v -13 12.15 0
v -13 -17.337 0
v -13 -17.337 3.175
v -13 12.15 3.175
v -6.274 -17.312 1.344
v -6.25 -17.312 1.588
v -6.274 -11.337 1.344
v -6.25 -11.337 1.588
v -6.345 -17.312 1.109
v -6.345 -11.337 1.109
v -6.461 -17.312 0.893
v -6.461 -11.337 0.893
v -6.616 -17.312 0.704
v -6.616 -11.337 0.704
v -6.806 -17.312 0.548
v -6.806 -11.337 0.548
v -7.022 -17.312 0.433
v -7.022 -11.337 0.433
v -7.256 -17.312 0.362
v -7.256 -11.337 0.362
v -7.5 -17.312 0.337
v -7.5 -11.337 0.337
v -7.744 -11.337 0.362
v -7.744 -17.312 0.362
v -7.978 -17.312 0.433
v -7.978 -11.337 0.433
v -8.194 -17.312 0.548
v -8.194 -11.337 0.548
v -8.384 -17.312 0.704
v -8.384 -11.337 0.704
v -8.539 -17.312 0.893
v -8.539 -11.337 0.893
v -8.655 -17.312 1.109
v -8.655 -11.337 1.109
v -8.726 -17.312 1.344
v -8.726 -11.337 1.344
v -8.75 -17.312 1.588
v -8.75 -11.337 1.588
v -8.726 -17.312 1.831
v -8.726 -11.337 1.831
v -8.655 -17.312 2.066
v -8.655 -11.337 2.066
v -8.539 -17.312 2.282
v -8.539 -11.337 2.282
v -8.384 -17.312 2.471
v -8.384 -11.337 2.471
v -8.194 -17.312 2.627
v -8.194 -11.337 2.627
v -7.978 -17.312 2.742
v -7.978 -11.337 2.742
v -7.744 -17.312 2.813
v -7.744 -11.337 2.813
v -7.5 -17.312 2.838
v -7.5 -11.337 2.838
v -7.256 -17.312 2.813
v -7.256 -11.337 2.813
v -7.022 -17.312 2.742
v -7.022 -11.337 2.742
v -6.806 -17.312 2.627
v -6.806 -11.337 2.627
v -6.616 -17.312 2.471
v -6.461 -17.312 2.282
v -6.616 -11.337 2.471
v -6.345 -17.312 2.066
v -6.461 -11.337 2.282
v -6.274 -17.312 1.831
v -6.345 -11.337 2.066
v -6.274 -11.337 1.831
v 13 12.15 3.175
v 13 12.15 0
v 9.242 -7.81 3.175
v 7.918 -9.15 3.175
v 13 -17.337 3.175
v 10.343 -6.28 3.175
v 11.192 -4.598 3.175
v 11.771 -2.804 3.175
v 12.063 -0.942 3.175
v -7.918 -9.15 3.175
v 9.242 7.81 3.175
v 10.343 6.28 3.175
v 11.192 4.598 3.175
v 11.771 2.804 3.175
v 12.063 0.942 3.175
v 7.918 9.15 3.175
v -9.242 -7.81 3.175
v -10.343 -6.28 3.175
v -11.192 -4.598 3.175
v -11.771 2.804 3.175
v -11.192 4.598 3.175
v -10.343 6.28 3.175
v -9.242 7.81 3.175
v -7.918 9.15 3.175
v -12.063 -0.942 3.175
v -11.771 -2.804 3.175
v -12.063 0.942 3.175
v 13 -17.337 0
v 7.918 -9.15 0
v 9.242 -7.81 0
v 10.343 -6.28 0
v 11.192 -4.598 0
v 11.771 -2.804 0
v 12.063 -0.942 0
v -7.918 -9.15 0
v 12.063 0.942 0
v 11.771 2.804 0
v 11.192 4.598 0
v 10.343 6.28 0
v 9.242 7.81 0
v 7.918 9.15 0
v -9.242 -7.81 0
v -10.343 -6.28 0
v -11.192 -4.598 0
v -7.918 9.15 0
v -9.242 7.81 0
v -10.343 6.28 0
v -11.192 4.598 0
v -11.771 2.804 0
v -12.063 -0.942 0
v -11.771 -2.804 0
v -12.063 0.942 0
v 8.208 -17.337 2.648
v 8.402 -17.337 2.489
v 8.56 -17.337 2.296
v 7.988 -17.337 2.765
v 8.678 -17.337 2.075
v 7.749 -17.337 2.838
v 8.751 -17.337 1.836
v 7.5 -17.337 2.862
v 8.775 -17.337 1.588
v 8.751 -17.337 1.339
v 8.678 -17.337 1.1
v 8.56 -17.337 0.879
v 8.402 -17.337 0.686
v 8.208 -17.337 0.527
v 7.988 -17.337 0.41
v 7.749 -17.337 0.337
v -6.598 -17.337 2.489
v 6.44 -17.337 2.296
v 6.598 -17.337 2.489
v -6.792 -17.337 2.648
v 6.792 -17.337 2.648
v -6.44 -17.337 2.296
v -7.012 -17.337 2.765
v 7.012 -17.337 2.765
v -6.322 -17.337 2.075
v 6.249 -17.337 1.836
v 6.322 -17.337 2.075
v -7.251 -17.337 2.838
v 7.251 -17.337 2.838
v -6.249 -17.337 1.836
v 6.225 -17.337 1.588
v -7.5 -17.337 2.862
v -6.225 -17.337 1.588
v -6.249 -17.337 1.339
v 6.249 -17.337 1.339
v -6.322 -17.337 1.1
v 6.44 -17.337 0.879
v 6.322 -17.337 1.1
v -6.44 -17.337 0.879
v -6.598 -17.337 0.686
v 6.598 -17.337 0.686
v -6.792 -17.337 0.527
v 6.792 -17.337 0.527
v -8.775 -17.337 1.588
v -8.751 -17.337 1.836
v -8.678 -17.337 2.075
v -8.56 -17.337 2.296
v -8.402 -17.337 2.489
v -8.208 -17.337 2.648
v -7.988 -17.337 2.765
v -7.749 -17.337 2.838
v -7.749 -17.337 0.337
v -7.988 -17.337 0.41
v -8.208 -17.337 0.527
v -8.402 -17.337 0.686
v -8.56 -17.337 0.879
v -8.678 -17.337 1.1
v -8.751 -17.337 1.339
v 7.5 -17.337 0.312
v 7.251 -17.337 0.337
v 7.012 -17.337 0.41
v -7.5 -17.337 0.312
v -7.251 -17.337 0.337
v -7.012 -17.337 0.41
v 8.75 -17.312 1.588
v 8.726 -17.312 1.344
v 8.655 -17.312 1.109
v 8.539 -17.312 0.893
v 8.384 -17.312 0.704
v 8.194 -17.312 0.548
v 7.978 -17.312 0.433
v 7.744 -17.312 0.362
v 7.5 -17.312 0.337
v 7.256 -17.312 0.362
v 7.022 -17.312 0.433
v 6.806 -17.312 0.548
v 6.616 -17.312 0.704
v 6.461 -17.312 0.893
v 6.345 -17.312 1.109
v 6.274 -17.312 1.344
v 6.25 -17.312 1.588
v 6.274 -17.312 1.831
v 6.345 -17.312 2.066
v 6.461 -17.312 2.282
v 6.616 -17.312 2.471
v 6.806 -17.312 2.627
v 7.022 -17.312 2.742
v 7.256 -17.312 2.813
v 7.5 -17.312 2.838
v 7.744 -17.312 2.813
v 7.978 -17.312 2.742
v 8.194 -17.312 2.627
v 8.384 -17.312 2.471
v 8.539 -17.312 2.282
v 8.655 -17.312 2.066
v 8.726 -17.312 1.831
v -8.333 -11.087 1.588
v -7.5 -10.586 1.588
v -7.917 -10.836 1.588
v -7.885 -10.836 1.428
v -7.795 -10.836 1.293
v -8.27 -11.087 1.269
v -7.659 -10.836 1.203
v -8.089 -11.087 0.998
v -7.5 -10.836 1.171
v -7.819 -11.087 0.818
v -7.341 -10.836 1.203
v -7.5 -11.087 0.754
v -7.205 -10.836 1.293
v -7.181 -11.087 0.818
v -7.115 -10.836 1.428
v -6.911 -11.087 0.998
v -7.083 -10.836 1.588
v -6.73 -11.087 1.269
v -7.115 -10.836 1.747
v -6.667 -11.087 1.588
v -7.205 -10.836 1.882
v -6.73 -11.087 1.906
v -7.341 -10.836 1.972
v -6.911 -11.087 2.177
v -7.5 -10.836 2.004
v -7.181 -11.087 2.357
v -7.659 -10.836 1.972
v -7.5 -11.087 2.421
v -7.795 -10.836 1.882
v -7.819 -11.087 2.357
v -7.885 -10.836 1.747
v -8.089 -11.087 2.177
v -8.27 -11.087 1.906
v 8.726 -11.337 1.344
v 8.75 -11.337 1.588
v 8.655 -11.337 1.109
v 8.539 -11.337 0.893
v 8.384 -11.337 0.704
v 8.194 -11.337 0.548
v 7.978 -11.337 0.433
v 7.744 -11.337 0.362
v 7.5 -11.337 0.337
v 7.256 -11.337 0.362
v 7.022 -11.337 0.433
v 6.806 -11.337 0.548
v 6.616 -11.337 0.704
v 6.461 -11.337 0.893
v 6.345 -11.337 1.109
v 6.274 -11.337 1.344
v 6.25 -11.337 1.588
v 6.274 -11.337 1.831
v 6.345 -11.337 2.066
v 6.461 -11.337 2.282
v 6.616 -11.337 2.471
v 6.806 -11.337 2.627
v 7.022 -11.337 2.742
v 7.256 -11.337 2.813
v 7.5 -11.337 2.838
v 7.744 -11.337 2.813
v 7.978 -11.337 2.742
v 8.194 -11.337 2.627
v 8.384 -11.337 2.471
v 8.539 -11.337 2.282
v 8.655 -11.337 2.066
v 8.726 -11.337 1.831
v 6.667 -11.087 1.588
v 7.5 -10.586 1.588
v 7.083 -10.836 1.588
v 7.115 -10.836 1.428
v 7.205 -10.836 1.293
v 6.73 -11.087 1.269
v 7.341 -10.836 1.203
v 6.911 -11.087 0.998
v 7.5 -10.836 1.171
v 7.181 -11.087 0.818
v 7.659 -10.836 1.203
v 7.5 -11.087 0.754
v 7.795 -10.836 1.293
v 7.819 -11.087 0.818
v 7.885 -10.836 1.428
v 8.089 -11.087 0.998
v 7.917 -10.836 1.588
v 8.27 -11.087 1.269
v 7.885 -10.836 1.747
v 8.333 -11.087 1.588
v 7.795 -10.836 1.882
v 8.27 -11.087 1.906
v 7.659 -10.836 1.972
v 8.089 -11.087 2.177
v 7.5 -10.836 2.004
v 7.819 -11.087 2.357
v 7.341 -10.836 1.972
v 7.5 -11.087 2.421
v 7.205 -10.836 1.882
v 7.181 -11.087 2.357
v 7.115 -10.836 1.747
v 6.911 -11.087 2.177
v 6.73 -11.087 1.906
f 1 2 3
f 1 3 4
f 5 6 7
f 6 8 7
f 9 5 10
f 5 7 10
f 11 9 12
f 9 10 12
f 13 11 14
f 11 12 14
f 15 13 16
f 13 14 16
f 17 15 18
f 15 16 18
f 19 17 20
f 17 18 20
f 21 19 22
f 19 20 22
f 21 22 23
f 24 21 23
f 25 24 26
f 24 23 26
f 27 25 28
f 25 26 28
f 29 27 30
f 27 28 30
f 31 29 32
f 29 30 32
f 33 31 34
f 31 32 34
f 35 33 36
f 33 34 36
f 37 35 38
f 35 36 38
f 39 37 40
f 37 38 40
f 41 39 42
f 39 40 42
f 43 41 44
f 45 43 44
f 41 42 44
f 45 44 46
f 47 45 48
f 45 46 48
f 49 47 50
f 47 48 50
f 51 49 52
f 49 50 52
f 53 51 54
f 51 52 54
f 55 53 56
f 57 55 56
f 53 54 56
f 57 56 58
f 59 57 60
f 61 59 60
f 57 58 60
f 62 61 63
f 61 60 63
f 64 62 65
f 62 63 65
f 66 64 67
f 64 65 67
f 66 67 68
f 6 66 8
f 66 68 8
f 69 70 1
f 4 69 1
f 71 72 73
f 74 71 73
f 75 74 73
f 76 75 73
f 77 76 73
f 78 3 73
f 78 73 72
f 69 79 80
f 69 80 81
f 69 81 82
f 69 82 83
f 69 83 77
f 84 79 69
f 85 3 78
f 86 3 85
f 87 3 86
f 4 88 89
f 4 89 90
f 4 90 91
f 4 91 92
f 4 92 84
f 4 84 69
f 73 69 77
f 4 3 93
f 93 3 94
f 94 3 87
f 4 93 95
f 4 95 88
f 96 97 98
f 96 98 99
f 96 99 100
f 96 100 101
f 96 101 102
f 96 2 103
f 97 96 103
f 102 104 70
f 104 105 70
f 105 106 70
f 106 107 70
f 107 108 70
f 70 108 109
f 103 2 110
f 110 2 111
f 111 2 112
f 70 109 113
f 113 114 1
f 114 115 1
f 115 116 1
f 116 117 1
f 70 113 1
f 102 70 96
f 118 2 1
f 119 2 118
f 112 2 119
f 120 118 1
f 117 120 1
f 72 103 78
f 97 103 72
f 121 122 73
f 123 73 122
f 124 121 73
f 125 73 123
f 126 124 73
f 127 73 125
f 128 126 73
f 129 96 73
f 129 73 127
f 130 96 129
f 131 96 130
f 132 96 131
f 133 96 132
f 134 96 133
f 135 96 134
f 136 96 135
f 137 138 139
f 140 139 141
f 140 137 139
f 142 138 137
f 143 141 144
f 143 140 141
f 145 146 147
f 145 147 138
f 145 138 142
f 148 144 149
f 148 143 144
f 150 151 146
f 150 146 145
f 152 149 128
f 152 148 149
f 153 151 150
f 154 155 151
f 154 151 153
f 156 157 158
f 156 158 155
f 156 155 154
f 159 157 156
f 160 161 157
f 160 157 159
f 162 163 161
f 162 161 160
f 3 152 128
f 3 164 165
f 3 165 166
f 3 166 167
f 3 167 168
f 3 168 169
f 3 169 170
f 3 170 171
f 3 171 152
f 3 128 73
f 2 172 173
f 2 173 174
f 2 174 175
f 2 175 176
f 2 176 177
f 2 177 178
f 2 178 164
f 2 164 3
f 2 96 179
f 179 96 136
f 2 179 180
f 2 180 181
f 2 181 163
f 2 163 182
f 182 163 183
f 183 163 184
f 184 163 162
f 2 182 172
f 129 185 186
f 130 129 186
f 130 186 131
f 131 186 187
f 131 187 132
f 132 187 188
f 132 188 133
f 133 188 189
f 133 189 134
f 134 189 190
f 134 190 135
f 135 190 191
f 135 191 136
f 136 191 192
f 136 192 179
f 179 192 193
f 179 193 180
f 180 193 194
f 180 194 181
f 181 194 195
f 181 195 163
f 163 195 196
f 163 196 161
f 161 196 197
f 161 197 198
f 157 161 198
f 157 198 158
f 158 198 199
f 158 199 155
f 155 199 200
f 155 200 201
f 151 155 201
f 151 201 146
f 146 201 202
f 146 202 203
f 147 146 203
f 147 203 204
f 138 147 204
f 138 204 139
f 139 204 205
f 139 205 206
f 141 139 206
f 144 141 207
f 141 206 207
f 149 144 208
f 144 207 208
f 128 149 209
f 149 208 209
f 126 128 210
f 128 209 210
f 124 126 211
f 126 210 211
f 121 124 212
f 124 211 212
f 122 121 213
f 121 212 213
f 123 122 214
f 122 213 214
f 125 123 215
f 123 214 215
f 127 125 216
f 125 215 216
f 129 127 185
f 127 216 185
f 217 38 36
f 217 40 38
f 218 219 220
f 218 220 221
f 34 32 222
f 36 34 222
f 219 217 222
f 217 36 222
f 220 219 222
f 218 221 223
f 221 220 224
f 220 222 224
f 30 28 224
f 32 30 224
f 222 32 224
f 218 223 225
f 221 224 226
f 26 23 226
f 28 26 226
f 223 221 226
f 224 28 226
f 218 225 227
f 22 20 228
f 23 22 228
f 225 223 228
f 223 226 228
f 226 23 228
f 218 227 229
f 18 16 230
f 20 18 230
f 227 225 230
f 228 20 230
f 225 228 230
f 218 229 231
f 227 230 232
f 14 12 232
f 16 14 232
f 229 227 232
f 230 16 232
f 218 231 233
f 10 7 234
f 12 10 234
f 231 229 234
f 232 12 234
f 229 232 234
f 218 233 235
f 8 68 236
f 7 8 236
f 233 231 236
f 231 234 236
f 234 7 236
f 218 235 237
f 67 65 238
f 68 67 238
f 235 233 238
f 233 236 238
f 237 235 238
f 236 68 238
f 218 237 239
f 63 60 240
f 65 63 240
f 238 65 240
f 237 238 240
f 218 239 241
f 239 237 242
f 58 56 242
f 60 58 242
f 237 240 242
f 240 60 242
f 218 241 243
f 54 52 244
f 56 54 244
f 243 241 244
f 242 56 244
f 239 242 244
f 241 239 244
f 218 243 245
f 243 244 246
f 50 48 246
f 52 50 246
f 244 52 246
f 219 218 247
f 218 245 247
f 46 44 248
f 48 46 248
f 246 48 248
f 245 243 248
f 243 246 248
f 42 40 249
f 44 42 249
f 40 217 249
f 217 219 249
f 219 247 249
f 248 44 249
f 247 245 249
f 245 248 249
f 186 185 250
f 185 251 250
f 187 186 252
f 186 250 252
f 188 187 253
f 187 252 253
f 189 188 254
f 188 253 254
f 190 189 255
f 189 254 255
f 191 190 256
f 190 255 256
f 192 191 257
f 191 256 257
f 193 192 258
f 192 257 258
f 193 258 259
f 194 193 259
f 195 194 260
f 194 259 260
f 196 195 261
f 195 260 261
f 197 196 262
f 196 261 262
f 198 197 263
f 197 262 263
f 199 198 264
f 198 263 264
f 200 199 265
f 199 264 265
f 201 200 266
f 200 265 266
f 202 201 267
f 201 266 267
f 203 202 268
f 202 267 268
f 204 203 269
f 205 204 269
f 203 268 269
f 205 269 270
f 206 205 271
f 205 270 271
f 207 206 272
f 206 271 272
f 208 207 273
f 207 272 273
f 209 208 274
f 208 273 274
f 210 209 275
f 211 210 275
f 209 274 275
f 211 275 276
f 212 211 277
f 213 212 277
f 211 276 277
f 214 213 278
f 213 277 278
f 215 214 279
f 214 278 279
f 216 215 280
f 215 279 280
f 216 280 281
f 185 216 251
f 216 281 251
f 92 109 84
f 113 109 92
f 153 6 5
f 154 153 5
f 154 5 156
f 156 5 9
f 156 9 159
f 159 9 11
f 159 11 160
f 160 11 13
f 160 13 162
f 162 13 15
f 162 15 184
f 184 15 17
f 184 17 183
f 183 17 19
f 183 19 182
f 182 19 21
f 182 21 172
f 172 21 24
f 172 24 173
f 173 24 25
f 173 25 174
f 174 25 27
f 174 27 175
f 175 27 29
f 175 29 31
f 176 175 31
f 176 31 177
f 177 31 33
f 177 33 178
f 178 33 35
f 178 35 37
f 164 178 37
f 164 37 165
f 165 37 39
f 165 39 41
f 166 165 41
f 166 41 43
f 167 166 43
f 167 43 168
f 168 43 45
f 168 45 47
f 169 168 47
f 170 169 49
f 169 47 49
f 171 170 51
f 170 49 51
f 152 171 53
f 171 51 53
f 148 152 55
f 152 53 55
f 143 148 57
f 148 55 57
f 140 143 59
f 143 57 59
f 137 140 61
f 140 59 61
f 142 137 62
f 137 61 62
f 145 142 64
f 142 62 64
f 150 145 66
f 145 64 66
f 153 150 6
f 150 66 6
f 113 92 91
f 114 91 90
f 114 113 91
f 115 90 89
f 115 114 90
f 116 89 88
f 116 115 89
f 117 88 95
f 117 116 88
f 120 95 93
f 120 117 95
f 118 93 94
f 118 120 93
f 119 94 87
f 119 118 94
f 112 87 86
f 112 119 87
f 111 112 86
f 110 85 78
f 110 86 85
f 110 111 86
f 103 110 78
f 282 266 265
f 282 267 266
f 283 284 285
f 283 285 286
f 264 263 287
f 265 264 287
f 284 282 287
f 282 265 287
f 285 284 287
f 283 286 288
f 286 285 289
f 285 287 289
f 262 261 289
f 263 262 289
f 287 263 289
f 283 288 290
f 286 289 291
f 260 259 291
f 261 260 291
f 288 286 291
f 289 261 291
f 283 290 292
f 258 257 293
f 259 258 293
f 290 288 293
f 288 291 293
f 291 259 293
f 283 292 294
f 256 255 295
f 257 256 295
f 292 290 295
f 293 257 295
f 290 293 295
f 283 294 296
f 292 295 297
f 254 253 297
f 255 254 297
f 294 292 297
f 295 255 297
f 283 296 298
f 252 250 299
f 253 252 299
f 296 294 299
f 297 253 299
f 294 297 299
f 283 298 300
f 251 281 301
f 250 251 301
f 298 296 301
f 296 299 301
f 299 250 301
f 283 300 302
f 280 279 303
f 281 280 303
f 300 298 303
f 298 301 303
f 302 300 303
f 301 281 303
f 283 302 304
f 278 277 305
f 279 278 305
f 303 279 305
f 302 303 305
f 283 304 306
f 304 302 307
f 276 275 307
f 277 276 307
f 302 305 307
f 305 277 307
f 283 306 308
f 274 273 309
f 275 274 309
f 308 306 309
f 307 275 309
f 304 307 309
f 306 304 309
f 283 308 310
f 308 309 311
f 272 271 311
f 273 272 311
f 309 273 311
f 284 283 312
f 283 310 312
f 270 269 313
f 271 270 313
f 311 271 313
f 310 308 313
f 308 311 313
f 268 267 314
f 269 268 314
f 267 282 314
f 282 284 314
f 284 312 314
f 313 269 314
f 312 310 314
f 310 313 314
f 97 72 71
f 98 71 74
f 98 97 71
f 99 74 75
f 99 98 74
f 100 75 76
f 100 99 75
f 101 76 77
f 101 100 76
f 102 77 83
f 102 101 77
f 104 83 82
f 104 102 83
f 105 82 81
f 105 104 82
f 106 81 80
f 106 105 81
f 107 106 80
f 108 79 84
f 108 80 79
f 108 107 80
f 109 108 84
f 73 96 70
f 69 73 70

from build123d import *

# Parameters (mm, degrees)
SKETCH2_W                             = 29.487
SKETCH2_H                             = 26
BOSS_EXTRUDE1_DEPTH                   = 3.175
CUT_EXTRUDE1_DEPTH                    = 22.900963312
TAP_DRILL_FOR_M3X0_5_TAP1_D           = 2.5
TAP_DRILL_FOR_M3X0_5_TAP1_DEPTH       = 6
TAP_DRILL_FOR_M3X0_5_TAP1_CSINK_D     = 2.55
TAP_DRILL_FOR_M3X0_5_TAP1_CSINK_ANGLE = 90
TAP_DRILL_FOR_M3X0_5_TAP1_TIP         = 0.751075774


with BuildPart() as part:
    # Sketch2 → Boss-Extrude1 (new body)
    with BuildSketch(Plane(origin=(0, 0, 0), x_dir=(0, 1, 0), z_dir=(0, 0, 1))):
        with Locations((-2.5935, 0)):
            Rectangle(SKETCH2_W, SKETCH2_H)
    extrude(amount=BOSS_EXTRUDE1_DEPTH)

    # Sketch1 → Cut-Extrude1 (cut, through all)
    with BuildSketch(Plane(origin=(0, 0, 0), x_dir=(0, 1, 0), z_dir=(0, 0, 1))):
        with BuildLine():
            Line((-9.15, 7.917543811), (-9.15, -7.917543811))
            ThreePointArc((-9.15, -7.917543811), (0, -12.1), (9.15, -7.917543811))
            Line((9.15, -7.917543811), (9.15, 7.917543811))
            ThreePointArc((9.15, 7.917543811), (0, 12.1), (-9.15, 7.917543811))
        make_face()
    extrude(amount=CUT_EXTRUDE1_DEPTH, mode=Mode.SUBTRACT)

    # Tap Drill for M3x0.5 Tap1
    with Locations(Plane(origin=(0, -17.337, 0), x_dir=(-1, 0, 0), z_dir=(0, -1, 0))):
        with Locations((-7.5, -1.5875), (7.5, -1.5875)):
            CounterSinkHole(TAP_DRILL_FOR_M3X0_5_TAP1_D / 2, TAP_DRILL_FOR_M3X0_5_TAP1_CSINK_D / 2, depth=TAP_DRILL_FOR_M3X0_5_TAP1_DEPTH, counter_sink_angle=TAP_DRILL_FOR_M3X0_5_TAP1_CSINK_ANGLE)
            with Locations((0, 0, -(TAP_DRILL_FOR_M3X0_5_TAP1_DEPTH + TAP_DRILL_FOR_M3X0_5_TAP1_TIP / 2))):  # 118° drill point
                Cone(0, TAP_DRILL_FOR_M3X0_5_TAP1_D / 2, TAP_DRILL_FOR_M3X0_5_TAP1_TIP, mode=Mode.SUBTRACT)


solid = part.part
